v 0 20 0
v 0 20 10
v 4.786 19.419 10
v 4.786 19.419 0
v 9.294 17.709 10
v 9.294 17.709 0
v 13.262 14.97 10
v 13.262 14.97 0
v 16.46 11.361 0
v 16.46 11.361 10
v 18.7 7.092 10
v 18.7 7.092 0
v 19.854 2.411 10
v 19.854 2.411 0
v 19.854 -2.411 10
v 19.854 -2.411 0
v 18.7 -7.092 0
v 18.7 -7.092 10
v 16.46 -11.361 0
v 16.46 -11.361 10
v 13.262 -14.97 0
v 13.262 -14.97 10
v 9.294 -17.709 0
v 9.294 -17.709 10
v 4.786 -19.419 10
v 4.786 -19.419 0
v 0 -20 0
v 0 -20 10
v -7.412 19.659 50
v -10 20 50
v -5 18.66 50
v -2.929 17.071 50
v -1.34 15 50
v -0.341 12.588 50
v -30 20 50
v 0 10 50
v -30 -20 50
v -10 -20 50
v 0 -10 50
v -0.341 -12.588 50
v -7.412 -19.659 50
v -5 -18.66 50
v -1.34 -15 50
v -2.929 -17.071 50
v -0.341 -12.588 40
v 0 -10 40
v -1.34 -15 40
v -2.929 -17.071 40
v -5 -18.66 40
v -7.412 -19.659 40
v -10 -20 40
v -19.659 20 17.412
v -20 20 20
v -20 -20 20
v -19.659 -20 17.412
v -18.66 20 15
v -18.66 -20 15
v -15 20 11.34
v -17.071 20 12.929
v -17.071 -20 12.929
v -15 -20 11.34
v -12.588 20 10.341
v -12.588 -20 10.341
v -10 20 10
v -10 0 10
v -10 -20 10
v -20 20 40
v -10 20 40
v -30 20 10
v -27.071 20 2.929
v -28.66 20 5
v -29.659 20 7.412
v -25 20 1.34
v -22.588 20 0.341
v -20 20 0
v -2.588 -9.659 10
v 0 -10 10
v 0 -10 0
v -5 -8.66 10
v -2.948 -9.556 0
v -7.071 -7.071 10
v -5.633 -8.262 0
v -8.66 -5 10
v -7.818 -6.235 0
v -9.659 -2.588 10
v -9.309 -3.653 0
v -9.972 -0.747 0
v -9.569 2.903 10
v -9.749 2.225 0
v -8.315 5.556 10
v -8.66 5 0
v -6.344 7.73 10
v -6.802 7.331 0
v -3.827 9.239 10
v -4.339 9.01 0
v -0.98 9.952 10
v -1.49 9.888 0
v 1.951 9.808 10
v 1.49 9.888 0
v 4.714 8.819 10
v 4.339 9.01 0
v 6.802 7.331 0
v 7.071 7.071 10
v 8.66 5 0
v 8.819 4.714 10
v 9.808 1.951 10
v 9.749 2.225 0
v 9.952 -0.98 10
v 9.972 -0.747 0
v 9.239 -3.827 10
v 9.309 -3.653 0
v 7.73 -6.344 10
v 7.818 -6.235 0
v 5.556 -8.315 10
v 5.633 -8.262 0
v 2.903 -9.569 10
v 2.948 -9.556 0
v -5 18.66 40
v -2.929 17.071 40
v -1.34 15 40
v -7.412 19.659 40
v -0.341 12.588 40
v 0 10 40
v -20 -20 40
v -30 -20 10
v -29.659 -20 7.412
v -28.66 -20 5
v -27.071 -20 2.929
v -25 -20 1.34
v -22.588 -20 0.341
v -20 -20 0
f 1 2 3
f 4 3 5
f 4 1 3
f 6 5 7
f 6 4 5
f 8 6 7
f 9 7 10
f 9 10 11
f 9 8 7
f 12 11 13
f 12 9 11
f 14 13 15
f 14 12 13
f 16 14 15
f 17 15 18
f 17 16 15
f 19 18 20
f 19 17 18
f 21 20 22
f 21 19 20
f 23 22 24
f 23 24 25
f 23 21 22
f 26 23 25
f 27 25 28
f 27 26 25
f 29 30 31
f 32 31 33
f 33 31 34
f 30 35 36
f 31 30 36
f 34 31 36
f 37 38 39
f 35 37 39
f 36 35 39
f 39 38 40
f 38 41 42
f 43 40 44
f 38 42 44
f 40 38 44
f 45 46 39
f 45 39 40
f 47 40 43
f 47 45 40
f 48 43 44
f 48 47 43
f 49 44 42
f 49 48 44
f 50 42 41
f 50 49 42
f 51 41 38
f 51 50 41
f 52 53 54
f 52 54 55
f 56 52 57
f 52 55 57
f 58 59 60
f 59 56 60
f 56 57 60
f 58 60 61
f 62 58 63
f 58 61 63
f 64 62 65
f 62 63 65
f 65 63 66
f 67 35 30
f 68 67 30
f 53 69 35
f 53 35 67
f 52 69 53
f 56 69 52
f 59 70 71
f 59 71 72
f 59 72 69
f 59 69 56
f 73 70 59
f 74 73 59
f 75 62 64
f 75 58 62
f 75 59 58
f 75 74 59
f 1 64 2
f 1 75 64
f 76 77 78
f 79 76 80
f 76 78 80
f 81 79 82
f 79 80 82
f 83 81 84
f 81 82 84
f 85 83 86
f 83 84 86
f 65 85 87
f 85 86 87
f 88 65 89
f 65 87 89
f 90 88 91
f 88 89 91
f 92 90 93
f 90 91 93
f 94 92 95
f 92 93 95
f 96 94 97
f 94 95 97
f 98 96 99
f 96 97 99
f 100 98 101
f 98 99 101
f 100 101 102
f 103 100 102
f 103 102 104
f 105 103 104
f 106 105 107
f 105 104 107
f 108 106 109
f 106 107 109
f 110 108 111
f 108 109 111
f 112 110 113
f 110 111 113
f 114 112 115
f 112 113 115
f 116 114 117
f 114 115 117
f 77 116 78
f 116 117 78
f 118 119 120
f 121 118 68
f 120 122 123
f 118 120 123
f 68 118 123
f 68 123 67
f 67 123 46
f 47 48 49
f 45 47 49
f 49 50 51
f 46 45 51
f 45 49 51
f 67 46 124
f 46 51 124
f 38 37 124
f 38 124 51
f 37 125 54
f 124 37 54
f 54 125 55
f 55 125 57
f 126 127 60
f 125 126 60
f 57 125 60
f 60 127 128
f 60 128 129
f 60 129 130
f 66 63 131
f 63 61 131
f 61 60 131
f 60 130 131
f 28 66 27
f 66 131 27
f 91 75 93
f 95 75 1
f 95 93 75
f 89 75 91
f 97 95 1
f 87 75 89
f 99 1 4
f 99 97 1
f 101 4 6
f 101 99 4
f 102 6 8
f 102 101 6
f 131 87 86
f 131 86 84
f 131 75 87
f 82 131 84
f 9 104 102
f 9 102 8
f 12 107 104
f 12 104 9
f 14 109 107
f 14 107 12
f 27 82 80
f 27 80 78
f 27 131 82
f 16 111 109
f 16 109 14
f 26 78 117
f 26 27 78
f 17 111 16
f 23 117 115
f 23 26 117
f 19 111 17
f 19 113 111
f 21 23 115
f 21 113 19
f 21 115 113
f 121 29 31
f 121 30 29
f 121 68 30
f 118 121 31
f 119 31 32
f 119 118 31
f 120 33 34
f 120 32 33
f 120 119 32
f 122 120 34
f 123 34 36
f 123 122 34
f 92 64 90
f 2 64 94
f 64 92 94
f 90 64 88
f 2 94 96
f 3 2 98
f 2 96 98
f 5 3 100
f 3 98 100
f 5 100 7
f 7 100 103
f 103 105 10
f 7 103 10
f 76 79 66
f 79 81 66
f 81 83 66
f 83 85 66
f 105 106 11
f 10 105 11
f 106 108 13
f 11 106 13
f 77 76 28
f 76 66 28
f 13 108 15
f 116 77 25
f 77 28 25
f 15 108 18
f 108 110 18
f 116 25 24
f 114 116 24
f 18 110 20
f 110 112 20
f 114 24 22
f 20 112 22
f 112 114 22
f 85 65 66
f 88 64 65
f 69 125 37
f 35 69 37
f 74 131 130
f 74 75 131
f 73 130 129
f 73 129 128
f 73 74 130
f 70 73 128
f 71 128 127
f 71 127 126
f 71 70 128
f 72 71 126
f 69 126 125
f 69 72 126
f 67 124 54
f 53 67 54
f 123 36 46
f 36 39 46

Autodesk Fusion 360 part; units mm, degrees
sketch "Sketch1" plane through (0, 0, 0) normal (0, 1, 0) x (1, 0, 0)
  line L0 (0, 0) -> (-30, 0)
  line L1 (-30, 0) -> (-30, -50)
  line L2 (-30, -50) -> (0, -50)
  line L3 (0, -50) -> (0, -40)
  line L4 (0, -40) -> (-20, -40)
  line L5 (-20, -40) -> (-20, -10)
  line L6 (-20, -10) -> (0, -10)
  line L7 (0, -10) -> (0, 0)
  dimension "d1" = 10
  dimension "d2" = 10
  dimension "d3" = 50
  dimension "d4" = 30
  dimension "d5" = 10
  dimension "d6" = 20
extrude "Extrude1" add sketch "Sketch1" along normal mid plane 40
sketch "Sketch2" plane through (0, 0, 0) normal (0, 0, -1) x (1, 0, 0)
  line L0 (-30, 20) -> (-30, -20)
  line L1 (-30, -20) -> (0, -20)
  line L2 (0, -20) -> (0, 20)
  line L3 (0, 20) -> (-30, 20)
  circle A0 centre (0, 0) radius 20
  circle A1 centre (0, 0) radius 10
  dimension "d9" = 20
extrude "Extrude2" add sketch "Sketch2" against normal blind 10 contours L2 A0 A1 picked at (16.5649, -1.4231)
extrude "Extrude3" cut sketch "Sketch2" against normal blind 15 contours L2 A1 picked at (-3.2498, -0.7417)
fillet "Fillet1" radius 10 2 edges at (-20, 0, 10) (-30, 0, 0)
fillet "Fillet2" radius 10 2 edges at (0, -20, 45) (0, 20, 45)
